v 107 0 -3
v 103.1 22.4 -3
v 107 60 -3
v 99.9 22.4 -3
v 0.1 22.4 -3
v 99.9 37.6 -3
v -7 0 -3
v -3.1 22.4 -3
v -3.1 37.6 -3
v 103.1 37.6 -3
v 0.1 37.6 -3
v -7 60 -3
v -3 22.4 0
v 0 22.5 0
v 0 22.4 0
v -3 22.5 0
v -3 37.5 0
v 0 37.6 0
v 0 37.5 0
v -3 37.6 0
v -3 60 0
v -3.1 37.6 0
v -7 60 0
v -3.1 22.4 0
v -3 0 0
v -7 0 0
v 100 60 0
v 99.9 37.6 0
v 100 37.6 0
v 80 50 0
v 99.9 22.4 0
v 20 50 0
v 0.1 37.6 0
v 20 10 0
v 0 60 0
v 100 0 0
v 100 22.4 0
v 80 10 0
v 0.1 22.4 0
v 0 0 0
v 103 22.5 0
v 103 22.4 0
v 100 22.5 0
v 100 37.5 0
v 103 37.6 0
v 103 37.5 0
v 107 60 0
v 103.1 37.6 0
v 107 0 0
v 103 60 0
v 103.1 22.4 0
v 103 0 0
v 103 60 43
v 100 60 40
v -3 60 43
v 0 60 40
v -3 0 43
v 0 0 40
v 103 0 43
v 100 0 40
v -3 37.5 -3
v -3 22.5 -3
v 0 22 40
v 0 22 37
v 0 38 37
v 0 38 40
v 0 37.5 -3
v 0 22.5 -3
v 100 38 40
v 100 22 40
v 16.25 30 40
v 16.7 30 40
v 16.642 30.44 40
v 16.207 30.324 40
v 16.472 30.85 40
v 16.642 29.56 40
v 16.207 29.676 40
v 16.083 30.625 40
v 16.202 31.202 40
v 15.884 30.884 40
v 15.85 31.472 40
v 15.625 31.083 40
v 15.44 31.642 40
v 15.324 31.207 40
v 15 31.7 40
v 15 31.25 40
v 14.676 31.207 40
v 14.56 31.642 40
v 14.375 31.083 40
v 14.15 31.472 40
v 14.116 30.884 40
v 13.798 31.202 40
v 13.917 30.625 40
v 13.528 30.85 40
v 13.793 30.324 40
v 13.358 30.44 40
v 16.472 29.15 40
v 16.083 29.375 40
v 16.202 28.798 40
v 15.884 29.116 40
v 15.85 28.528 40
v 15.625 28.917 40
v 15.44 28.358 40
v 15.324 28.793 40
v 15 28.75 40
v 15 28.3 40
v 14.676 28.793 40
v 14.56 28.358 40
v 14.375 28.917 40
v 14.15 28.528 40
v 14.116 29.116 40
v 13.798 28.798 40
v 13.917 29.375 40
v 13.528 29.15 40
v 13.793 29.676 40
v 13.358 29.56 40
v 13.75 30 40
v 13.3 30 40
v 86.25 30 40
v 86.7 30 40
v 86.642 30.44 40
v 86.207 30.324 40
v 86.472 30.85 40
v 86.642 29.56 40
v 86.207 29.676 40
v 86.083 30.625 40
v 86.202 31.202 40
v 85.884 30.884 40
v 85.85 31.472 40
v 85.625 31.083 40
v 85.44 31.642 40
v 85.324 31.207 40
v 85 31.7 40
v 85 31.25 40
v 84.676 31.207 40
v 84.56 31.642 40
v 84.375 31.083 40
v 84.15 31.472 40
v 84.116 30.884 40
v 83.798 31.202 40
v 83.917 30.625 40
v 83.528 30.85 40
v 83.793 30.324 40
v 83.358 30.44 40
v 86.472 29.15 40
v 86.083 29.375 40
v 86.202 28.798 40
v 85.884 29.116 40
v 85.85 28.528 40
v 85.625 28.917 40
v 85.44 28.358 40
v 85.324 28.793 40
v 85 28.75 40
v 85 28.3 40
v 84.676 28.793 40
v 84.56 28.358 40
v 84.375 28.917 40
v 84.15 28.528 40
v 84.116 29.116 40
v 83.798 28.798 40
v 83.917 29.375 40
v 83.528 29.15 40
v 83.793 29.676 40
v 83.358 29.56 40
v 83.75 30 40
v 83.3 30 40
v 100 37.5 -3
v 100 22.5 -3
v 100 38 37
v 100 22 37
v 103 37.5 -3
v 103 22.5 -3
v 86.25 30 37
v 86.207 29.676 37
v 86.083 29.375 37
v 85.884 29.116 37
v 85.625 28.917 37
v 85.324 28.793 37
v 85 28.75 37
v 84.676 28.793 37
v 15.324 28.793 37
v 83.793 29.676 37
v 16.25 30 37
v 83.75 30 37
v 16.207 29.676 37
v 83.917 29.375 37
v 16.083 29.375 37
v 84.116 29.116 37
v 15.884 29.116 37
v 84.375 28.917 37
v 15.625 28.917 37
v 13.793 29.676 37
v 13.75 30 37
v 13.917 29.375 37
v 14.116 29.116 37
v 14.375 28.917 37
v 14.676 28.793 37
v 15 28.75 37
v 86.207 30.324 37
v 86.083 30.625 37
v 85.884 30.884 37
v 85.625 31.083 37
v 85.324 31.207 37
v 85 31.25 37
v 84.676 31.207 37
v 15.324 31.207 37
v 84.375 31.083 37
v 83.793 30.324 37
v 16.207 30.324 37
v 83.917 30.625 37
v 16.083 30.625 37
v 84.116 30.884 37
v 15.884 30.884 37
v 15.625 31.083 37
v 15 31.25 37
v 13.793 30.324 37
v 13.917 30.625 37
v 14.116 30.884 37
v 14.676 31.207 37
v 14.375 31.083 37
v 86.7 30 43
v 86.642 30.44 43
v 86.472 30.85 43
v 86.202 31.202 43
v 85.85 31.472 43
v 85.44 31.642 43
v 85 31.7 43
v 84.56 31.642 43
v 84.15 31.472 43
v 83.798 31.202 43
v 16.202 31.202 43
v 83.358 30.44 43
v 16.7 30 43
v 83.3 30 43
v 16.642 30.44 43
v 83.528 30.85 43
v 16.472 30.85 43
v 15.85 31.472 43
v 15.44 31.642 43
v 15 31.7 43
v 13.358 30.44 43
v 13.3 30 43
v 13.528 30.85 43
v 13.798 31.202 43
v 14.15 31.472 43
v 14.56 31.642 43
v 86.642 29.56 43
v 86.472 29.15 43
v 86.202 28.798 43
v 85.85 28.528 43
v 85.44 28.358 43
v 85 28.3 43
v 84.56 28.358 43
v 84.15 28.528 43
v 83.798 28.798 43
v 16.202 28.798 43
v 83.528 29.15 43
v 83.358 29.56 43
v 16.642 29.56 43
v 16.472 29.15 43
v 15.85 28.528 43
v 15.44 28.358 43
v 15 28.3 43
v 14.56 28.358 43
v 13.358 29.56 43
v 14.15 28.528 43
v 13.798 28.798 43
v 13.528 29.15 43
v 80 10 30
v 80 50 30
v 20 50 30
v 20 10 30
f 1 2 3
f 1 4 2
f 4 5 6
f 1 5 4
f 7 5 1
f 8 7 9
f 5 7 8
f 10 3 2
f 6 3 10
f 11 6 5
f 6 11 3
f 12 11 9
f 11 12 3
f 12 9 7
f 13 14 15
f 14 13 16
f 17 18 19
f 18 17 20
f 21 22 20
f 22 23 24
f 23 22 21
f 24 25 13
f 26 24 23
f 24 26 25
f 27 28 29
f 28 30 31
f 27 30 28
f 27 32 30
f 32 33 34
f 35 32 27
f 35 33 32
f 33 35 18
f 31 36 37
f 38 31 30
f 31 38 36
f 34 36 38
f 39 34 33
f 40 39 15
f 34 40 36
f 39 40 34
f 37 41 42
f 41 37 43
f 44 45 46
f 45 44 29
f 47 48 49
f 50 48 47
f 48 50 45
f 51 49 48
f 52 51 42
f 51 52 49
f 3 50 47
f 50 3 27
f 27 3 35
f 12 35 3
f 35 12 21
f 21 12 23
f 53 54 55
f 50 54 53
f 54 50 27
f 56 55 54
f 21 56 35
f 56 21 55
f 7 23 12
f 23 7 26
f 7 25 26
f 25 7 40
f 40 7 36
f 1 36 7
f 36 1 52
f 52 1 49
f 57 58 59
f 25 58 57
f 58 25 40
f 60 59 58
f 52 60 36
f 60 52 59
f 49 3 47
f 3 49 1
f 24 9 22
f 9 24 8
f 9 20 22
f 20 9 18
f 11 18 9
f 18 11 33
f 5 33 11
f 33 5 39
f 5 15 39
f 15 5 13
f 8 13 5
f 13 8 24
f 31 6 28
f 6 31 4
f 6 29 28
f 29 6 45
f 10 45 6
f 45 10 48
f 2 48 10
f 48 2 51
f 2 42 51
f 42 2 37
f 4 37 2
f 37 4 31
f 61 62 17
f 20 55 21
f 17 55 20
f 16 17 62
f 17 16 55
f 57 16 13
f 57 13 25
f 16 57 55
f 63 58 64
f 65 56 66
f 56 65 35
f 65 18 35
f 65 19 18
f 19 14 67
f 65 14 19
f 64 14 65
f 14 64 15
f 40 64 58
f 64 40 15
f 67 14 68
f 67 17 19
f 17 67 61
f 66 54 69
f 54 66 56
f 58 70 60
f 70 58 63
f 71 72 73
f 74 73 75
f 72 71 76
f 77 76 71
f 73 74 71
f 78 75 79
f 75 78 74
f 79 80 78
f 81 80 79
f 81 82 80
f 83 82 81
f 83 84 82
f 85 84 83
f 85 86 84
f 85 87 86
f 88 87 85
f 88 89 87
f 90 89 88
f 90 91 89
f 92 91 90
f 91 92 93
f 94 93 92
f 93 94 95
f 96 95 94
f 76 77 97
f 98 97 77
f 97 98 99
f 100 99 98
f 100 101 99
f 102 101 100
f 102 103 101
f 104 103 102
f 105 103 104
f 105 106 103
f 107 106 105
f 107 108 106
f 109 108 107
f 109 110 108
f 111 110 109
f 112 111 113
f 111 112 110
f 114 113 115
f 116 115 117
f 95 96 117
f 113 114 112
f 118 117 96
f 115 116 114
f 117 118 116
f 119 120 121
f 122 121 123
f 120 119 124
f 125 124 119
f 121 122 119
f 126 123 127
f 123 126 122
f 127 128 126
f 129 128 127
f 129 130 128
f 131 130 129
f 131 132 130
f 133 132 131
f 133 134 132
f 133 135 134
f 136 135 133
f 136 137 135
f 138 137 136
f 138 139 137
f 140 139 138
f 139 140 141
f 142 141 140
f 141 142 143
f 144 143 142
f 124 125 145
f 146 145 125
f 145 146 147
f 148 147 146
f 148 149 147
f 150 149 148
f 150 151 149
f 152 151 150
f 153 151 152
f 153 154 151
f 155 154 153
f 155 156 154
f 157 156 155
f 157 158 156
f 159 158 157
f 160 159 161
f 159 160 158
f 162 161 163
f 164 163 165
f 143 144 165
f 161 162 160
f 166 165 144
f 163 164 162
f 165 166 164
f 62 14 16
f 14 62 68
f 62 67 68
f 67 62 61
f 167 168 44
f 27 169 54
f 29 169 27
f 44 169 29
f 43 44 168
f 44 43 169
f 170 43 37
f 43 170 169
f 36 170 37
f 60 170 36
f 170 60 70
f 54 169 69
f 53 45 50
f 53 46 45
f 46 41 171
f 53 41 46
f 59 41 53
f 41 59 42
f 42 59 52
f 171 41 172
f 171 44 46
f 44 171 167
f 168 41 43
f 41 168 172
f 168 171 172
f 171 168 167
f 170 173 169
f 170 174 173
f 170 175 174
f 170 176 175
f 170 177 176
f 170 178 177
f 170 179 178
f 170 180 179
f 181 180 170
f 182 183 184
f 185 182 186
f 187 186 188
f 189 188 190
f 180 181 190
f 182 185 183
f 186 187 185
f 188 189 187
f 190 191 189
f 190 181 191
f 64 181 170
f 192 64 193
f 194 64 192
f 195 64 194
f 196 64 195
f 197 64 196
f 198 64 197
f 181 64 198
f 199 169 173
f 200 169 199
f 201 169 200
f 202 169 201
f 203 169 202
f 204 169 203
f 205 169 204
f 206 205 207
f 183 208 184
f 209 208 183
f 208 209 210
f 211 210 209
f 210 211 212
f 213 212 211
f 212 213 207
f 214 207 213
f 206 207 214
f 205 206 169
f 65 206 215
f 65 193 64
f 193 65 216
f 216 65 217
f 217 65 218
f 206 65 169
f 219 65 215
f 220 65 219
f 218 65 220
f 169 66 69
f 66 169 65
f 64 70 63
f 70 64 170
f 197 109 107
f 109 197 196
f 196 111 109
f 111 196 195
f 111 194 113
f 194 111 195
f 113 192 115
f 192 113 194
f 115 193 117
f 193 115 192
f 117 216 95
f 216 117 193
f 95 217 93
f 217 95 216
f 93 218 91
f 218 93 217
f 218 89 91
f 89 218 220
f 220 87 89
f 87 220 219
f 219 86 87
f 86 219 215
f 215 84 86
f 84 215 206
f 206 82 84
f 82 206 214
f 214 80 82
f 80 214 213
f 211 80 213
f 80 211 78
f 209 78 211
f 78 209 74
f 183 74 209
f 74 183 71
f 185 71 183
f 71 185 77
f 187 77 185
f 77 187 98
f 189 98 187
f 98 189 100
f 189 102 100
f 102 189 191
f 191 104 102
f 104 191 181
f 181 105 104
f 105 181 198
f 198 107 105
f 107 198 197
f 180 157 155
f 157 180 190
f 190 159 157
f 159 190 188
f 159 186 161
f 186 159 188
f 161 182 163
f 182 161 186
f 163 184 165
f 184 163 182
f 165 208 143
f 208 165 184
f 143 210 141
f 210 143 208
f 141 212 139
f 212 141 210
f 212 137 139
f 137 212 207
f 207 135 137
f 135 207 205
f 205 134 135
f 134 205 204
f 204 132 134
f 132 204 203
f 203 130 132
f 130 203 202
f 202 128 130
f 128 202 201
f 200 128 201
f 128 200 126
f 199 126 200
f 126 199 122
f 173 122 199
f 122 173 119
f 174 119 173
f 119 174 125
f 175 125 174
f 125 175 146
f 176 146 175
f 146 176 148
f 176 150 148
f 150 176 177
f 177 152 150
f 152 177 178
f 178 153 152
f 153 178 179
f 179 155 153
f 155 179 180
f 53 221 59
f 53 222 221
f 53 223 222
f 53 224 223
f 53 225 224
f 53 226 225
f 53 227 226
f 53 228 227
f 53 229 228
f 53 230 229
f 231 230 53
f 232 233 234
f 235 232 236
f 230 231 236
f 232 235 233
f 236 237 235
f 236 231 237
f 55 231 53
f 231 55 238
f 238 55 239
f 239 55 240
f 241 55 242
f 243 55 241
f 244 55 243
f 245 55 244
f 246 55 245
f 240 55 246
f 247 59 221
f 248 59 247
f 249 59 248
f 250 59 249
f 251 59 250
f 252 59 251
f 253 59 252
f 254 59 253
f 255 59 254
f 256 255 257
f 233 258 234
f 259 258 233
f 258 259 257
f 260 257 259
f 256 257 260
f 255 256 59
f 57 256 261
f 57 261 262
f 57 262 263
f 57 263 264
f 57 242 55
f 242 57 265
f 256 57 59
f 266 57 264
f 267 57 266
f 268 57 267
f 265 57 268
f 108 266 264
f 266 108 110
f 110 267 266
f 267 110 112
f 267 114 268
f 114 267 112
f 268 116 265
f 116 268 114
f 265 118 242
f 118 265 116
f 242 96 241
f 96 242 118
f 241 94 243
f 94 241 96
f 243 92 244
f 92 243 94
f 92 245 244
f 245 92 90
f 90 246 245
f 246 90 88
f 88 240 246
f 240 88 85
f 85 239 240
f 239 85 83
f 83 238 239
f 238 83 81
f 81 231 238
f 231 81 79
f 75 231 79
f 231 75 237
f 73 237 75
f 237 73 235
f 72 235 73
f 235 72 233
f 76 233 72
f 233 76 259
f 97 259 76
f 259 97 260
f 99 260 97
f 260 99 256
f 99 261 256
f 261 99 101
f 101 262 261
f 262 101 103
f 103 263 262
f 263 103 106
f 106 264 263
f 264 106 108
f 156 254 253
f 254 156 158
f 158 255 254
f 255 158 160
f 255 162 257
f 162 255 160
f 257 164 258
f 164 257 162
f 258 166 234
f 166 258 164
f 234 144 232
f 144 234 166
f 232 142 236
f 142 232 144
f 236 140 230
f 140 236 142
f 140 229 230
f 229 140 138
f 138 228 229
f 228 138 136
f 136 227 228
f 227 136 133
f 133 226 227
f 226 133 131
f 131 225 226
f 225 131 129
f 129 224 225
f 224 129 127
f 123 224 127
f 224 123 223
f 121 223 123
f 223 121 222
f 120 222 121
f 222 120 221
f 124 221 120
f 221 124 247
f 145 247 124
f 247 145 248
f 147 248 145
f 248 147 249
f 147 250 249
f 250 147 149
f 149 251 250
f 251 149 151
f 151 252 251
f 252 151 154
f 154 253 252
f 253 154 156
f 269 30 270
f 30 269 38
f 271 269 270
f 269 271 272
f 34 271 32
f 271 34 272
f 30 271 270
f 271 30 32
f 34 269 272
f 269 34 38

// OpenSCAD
part = "all";      // which piece to output, "all" for the full assembly
box_w = 100;       // inside width
box_d = 60;        // inside depth
box_h = 40;        // inside height
sheet = 3;         // sheet thickness
tab_l = 15;        // tab length
fit = 0.1;         // slot clearance per side
screw = 3.4;       // lid screw clearance hole
tap = 2.5;         // strap pilot hole, tap M3

parts = [ // id, label, note, pull-apart [x,y,z]
  ["base","Base","3 mm sheet",[0,0,0]],
  ["left","Left wall","3 mm sheet",[-40,0,0]],
  ["right","Right wall","3 mm sheet",[40,0,0]],
  ["strap","Lid strap","3 mm sheet, tap M3",[0,0,30]],
  ["lid","Lid","3 mm sheet",[0,0,70]],
  ["hw_cell","Battery","reference only"]
];

w=box_w; d=box_d; h=box_h; t=sheet; f=fit;
module wall(x) translate([x,0,0]) rotate([90,0,90]) linear_extrude(t) union(){
  square([d,h]);
  translate([d/2-tab_l/2,-t]) square([tab_l,t]);
}
module base() translate([0,0,-t]) linear_extrude(t) difference(){
  translate([-t-4,0]) square([w+2*t+8,d]);
  for(x=[-t,w]) translate([x-f,d/2-tab_l/2-f]) square([t+2*f,tab_l+2*f]);
}
module strap() translate([0,d/2-8,h-t]) linear_extrude(t) difference(){
  square([w,16]);
  for(x=[15,w-15]) translate([x,8]) circle(d=tap,$fn=24);
}
module lid() translate([0,0,h]) linear_extrude(t) difference(){
  translate([-t,0]) square([w+2*t,d]);
  for(x=[15,w-15]) translate([x,d/2]) circle(d=screw,$fn=24);
}
module pick(n){ if(part=="all"||part==n) children(); }
pick("base") base();
pick("left") wall(-t);
pick("right") wall(w);
pick("strap") strap();
pick("lid") lid();
pick("hw_cell") translate([20,10,0]) cube([60,40,30]);
